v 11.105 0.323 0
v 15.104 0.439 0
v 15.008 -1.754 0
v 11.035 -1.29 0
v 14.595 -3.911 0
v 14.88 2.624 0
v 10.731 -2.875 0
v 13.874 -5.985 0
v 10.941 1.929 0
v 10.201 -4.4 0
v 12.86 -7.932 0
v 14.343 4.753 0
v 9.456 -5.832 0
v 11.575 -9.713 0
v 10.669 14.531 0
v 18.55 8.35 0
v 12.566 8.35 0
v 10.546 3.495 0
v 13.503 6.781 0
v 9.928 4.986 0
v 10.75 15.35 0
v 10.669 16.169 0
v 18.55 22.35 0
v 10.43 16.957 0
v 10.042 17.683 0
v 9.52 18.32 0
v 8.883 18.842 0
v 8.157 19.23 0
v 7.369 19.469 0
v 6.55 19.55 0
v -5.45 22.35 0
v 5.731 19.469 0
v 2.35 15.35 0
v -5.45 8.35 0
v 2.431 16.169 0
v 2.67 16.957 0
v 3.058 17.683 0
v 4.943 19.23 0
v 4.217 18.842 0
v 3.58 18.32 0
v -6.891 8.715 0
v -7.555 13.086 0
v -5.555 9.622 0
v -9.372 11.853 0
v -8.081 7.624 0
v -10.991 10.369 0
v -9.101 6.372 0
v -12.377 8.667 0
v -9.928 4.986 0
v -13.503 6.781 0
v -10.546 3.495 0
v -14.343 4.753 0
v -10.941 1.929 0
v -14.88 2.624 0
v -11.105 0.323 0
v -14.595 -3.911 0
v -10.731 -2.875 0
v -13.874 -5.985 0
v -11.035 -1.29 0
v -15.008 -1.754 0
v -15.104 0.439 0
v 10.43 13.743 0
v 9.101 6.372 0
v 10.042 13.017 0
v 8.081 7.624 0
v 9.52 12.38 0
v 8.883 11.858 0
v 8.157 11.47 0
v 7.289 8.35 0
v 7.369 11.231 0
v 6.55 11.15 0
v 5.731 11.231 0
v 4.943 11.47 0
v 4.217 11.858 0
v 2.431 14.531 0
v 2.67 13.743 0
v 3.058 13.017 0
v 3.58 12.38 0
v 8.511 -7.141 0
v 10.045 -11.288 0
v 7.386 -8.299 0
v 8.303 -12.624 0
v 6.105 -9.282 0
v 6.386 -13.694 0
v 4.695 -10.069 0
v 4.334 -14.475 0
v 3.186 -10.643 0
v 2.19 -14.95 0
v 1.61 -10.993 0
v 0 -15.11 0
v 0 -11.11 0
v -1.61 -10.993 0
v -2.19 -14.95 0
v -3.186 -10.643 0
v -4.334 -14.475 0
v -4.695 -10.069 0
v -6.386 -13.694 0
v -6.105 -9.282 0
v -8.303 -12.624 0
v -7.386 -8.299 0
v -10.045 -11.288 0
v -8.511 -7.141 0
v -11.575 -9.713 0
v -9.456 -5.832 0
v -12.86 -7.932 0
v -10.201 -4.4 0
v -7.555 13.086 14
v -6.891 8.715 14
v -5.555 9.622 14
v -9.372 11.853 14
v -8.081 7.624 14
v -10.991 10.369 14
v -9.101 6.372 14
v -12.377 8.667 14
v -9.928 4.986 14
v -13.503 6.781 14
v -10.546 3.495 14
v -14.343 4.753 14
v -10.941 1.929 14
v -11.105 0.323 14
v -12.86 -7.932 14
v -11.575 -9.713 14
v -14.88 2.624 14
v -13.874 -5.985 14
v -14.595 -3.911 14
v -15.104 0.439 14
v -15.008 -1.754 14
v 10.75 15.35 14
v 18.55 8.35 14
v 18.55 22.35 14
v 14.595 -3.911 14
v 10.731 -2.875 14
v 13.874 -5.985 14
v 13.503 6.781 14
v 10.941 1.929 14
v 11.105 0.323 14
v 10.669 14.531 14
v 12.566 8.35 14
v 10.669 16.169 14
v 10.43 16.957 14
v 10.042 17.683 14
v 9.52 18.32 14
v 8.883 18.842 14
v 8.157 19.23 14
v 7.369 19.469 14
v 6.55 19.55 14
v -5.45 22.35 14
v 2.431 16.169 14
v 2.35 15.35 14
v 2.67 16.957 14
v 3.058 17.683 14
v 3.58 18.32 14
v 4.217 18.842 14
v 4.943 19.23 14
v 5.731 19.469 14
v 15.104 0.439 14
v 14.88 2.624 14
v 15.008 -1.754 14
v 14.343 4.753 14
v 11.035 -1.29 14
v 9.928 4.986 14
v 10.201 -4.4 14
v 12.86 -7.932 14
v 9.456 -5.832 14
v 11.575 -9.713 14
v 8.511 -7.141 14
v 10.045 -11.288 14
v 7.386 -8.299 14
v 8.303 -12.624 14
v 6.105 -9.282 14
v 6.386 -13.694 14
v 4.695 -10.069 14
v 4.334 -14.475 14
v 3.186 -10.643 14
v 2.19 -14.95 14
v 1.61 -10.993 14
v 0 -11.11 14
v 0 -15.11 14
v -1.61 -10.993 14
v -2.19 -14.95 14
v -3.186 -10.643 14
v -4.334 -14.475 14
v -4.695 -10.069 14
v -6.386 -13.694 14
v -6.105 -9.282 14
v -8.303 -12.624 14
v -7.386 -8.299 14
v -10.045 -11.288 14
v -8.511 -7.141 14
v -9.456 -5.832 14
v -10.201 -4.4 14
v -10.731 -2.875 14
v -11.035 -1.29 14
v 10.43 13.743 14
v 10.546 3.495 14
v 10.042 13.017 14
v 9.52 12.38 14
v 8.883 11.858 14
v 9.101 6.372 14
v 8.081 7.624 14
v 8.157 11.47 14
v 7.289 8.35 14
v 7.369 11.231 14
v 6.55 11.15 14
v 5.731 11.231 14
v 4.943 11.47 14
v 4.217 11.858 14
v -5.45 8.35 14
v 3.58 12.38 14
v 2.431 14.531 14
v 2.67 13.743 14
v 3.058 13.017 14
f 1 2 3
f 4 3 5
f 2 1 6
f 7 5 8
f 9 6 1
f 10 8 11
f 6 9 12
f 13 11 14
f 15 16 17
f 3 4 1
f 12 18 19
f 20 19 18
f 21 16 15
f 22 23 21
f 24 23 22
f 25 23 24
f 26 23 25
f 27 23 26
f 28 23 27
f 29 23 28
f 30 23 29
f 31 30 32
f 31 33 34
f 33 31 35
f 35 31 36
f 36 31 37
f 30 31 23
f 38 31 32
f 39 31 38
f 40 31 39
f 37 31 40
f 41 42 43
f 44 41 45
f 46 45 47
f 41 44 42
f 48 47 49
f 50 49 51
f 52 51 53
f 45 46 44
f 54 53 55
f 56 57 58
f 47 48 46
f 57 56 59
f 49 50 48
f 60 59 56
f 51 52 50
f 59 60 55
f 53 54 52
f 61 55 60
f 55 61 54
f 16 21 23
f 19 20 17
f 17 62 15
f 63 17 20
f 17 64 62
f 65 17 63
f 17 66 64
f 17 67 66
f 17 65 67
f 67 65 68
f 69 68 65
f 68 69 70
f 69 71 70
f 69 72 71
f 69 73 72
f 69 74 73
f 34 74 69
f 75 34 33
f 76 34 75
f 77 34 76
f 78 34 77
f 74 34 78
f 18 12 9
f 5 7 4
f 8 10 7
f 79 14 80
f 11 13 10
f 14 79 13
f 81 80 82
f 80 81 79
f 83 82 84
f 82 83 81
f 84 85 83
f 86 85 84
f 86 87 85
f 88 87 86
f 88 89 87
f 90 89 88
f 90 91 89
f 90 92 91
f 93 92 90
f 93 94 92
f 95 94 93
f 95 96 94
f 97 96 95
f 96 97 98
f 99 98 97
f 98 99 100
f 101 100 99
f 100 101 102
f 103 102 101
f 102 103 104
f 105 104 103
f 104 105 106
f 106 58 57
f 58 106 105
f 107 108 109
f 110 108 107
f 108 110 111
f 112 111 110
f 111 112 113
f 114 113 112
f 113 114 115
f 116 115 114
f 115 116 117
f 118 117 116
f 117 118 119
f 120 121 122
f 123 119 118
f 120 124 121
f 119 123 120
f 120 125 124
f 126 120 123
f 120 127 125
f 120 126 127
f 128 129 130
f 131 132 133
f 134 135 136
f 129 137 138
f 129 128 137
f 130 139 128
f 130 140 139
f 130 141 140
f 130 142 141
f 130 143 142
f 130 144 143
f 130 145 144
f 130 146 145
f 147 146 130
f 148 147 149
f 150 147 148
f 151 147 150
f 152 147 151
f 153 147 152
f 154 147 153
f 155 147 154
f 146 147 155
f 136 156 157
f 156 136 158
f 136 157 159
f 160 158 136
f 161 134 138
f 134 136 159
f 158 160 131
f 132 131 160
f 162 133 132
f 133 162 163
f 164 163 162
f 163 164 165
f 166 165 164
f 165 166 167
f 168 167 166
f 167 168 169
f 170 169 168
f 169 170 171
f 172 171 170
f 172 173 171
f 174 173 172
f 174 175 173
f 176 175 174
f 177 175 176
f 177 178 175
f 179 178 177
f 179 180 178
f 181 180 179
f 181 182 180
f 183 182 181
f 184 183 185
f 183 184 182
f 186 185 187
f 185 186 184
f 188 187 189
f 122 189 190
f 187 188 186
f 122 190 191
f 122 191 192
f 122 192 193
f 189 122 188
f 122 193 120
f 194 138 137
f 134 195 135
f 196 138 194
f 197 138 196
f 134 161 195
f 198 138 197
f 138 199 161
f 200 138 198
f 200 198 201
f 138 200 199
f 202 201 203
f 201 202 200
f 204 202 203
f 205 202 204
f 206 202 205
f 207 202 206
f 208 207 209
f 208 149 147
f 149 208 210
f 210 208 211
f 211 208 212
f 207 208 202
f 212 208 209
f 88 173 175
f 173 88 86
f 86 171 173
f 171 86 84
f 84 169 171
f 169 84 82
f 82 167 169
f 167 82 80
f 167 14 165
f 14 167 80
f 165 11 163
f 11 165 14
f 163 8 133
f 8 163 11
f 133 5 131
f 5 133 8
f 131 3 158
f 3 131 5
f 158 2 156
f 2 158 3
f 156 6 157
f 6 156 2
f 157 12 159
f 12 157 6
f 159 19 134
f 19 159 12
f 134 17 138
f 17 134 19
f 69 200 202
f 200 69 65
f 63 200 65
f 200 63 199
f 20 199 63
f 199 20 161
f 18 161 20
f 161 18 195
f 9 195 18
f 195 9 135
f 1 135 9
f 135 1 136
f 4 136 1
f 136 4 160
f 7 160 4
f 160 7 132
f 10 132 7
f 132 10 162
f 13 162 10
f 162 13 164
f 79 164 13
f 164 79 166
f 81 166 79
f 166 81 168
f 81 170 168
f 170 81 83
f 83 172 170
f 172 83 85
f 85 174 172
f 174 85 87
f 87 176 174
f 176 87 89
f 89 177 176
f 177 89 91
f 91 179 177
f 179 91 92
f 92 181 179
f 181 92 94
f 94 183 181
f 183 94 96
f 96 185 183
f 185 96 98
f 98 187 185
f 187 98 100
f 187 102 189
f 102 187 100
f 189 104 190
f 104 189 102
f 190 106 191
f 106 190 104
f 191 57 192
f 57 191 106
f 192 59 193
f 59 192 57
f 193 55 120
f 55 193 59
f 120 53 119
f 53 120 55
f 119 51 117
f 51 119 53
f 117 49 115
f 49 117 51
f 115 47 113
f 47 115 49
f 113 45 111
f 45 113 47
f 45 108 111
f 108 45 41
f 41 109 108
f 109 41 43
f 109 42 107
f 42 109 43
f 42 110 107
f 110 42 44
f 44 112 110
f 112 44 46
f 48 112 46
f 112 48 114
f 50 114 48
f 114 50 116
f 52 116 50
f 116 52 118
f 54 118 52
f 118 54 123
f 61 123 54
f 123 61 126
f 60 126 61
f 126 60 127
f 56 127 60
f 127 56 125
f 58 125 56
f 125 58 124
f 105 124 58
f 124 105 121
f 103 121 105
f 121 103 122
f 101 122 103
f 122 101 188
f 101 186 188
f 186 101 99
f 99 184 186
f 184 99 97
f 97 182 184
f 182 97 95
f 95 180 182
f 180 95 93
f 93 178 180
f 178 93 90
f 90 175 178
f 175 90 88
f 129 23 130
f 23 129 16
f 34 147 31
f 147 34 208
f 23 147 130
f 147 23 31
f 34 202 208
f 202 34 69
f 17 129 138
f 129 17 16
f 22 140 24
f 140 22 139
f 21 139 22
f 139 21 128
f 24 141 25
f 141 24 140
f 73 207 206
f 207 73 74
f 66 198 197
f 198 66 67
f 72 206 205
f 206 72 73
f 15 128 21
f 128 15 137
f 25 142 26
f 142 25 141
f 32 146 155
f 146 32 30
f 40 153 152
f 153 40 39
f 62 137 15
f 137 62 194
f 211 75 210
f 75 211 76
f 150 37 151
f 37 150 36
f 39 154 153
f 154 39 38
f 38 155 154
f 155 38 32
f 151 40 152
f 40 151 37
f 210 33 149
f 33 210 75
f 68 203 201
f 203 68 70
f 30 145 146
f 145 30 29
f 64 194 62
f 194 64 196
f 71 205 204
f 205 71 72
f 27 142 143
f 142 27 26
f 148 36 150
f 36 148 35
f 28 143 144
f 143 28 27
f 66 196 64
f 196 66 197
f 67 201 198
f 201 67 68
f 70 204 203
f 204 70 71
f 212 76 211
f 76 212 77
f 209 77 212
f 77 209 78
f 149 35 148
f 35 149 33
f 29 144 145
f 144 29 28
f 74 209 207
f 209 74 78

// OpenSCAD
$fn = 32;

// ----------------------------------------------------------------------
// Pipe clamp: 30.22 mm ring, 4 mm wall, 14 mm wide
// ----------------------------------------------------------------------

// --- parameters (mm) ---
outer_r = 15.11;          // clamp outside radius
inner_r = 11.11;          // pipe bore radius
band = 4;                 // band thickness
clamp_w = 14;             // clamp width
opening = 60;             // opening angle between the ends
lug_w = 24;               // lug width
lug_len = 14;             // lug length
bolt_d = 8.4;             // bolt hole

clamp_profile = [[-7.555, 13.086], [-9.372, 11.853], [-10.991, 10.369], [-12.377, 8.667], [-13.503, 6.781], [-14.343, 4.753], [-14.88, 2.624], [-15.104, 0.439], [-15.008, -1.754], [-14.595, -3.911], [-13.874, -5.985], [-12.86, -7.932], [-11.575, -9.713], [-10.045, -11.288], [-8.303, -12.624], [-6.386, -13.694], [-4.334, -14.475], [-2.19, -14.95], [0, -15.11], [2.19, -14.95], [4.334, -14.475], [6.386, -13.694], [8.303, -12.624], [10.045, -11.288], [11.575, -9.713], [12.86, -7.932], [13.874, -5.985], [14.595, -3.911], [15.008, -1.754], [15.104, 0.439], [14.88, 2.624], [14.343, 4.753], [13.503, 6.781], [12.377, 8.667], [10.991, 10.369], [9.372, 11.853], [7.555, 13.086], [5.555, 9.622], [6.891, 8.715], [8.081, 7.624], [9.101, 6.372], [9.928, 4.986], [10.546, 3.495], [10.941, 1.929], [11.105, 0.323], [11.035, -1.29], [10.731, -2.875], [10.201, -4.4], [9.456, -5.832], [8.511, -7.141], [7.386, -8.299], [6.105, -9.282], [4.695, -10.069], [3.186, -10.643], [1.61, -10.993], [0, -11.11], [-1.61, -10.993], [-3.186, -10.643], [-4.695, -10.069], [-6.105, -9.282], [-7.386, -8.299], [-8.511, -7.141], [-9.456, -5.832], [-10.201, -4.4], [-10.731, -2.875], [-11.035, -1.29], [-11.105, 0.323], [-10.941, 1.929], [-10.546, 3.495], [-9.928, 4.986], [-9.101, 6.372], [-8.081, 7.624], [-6.891, 8.715], [-5.555, 9.622]];

difference() {
  union() {
    linear_extrude(height = clamp_w) polygon(clamp_profile);
    /* bolt lug on the other end */
    translate([-5.45, 8.35, 0]) cube([lug_w, 14, clamp_w]);
  }
  translate([6.55, 15.35, -2.5]) cylinder(h = clamp_w + 5, d = bolt_d);
}
